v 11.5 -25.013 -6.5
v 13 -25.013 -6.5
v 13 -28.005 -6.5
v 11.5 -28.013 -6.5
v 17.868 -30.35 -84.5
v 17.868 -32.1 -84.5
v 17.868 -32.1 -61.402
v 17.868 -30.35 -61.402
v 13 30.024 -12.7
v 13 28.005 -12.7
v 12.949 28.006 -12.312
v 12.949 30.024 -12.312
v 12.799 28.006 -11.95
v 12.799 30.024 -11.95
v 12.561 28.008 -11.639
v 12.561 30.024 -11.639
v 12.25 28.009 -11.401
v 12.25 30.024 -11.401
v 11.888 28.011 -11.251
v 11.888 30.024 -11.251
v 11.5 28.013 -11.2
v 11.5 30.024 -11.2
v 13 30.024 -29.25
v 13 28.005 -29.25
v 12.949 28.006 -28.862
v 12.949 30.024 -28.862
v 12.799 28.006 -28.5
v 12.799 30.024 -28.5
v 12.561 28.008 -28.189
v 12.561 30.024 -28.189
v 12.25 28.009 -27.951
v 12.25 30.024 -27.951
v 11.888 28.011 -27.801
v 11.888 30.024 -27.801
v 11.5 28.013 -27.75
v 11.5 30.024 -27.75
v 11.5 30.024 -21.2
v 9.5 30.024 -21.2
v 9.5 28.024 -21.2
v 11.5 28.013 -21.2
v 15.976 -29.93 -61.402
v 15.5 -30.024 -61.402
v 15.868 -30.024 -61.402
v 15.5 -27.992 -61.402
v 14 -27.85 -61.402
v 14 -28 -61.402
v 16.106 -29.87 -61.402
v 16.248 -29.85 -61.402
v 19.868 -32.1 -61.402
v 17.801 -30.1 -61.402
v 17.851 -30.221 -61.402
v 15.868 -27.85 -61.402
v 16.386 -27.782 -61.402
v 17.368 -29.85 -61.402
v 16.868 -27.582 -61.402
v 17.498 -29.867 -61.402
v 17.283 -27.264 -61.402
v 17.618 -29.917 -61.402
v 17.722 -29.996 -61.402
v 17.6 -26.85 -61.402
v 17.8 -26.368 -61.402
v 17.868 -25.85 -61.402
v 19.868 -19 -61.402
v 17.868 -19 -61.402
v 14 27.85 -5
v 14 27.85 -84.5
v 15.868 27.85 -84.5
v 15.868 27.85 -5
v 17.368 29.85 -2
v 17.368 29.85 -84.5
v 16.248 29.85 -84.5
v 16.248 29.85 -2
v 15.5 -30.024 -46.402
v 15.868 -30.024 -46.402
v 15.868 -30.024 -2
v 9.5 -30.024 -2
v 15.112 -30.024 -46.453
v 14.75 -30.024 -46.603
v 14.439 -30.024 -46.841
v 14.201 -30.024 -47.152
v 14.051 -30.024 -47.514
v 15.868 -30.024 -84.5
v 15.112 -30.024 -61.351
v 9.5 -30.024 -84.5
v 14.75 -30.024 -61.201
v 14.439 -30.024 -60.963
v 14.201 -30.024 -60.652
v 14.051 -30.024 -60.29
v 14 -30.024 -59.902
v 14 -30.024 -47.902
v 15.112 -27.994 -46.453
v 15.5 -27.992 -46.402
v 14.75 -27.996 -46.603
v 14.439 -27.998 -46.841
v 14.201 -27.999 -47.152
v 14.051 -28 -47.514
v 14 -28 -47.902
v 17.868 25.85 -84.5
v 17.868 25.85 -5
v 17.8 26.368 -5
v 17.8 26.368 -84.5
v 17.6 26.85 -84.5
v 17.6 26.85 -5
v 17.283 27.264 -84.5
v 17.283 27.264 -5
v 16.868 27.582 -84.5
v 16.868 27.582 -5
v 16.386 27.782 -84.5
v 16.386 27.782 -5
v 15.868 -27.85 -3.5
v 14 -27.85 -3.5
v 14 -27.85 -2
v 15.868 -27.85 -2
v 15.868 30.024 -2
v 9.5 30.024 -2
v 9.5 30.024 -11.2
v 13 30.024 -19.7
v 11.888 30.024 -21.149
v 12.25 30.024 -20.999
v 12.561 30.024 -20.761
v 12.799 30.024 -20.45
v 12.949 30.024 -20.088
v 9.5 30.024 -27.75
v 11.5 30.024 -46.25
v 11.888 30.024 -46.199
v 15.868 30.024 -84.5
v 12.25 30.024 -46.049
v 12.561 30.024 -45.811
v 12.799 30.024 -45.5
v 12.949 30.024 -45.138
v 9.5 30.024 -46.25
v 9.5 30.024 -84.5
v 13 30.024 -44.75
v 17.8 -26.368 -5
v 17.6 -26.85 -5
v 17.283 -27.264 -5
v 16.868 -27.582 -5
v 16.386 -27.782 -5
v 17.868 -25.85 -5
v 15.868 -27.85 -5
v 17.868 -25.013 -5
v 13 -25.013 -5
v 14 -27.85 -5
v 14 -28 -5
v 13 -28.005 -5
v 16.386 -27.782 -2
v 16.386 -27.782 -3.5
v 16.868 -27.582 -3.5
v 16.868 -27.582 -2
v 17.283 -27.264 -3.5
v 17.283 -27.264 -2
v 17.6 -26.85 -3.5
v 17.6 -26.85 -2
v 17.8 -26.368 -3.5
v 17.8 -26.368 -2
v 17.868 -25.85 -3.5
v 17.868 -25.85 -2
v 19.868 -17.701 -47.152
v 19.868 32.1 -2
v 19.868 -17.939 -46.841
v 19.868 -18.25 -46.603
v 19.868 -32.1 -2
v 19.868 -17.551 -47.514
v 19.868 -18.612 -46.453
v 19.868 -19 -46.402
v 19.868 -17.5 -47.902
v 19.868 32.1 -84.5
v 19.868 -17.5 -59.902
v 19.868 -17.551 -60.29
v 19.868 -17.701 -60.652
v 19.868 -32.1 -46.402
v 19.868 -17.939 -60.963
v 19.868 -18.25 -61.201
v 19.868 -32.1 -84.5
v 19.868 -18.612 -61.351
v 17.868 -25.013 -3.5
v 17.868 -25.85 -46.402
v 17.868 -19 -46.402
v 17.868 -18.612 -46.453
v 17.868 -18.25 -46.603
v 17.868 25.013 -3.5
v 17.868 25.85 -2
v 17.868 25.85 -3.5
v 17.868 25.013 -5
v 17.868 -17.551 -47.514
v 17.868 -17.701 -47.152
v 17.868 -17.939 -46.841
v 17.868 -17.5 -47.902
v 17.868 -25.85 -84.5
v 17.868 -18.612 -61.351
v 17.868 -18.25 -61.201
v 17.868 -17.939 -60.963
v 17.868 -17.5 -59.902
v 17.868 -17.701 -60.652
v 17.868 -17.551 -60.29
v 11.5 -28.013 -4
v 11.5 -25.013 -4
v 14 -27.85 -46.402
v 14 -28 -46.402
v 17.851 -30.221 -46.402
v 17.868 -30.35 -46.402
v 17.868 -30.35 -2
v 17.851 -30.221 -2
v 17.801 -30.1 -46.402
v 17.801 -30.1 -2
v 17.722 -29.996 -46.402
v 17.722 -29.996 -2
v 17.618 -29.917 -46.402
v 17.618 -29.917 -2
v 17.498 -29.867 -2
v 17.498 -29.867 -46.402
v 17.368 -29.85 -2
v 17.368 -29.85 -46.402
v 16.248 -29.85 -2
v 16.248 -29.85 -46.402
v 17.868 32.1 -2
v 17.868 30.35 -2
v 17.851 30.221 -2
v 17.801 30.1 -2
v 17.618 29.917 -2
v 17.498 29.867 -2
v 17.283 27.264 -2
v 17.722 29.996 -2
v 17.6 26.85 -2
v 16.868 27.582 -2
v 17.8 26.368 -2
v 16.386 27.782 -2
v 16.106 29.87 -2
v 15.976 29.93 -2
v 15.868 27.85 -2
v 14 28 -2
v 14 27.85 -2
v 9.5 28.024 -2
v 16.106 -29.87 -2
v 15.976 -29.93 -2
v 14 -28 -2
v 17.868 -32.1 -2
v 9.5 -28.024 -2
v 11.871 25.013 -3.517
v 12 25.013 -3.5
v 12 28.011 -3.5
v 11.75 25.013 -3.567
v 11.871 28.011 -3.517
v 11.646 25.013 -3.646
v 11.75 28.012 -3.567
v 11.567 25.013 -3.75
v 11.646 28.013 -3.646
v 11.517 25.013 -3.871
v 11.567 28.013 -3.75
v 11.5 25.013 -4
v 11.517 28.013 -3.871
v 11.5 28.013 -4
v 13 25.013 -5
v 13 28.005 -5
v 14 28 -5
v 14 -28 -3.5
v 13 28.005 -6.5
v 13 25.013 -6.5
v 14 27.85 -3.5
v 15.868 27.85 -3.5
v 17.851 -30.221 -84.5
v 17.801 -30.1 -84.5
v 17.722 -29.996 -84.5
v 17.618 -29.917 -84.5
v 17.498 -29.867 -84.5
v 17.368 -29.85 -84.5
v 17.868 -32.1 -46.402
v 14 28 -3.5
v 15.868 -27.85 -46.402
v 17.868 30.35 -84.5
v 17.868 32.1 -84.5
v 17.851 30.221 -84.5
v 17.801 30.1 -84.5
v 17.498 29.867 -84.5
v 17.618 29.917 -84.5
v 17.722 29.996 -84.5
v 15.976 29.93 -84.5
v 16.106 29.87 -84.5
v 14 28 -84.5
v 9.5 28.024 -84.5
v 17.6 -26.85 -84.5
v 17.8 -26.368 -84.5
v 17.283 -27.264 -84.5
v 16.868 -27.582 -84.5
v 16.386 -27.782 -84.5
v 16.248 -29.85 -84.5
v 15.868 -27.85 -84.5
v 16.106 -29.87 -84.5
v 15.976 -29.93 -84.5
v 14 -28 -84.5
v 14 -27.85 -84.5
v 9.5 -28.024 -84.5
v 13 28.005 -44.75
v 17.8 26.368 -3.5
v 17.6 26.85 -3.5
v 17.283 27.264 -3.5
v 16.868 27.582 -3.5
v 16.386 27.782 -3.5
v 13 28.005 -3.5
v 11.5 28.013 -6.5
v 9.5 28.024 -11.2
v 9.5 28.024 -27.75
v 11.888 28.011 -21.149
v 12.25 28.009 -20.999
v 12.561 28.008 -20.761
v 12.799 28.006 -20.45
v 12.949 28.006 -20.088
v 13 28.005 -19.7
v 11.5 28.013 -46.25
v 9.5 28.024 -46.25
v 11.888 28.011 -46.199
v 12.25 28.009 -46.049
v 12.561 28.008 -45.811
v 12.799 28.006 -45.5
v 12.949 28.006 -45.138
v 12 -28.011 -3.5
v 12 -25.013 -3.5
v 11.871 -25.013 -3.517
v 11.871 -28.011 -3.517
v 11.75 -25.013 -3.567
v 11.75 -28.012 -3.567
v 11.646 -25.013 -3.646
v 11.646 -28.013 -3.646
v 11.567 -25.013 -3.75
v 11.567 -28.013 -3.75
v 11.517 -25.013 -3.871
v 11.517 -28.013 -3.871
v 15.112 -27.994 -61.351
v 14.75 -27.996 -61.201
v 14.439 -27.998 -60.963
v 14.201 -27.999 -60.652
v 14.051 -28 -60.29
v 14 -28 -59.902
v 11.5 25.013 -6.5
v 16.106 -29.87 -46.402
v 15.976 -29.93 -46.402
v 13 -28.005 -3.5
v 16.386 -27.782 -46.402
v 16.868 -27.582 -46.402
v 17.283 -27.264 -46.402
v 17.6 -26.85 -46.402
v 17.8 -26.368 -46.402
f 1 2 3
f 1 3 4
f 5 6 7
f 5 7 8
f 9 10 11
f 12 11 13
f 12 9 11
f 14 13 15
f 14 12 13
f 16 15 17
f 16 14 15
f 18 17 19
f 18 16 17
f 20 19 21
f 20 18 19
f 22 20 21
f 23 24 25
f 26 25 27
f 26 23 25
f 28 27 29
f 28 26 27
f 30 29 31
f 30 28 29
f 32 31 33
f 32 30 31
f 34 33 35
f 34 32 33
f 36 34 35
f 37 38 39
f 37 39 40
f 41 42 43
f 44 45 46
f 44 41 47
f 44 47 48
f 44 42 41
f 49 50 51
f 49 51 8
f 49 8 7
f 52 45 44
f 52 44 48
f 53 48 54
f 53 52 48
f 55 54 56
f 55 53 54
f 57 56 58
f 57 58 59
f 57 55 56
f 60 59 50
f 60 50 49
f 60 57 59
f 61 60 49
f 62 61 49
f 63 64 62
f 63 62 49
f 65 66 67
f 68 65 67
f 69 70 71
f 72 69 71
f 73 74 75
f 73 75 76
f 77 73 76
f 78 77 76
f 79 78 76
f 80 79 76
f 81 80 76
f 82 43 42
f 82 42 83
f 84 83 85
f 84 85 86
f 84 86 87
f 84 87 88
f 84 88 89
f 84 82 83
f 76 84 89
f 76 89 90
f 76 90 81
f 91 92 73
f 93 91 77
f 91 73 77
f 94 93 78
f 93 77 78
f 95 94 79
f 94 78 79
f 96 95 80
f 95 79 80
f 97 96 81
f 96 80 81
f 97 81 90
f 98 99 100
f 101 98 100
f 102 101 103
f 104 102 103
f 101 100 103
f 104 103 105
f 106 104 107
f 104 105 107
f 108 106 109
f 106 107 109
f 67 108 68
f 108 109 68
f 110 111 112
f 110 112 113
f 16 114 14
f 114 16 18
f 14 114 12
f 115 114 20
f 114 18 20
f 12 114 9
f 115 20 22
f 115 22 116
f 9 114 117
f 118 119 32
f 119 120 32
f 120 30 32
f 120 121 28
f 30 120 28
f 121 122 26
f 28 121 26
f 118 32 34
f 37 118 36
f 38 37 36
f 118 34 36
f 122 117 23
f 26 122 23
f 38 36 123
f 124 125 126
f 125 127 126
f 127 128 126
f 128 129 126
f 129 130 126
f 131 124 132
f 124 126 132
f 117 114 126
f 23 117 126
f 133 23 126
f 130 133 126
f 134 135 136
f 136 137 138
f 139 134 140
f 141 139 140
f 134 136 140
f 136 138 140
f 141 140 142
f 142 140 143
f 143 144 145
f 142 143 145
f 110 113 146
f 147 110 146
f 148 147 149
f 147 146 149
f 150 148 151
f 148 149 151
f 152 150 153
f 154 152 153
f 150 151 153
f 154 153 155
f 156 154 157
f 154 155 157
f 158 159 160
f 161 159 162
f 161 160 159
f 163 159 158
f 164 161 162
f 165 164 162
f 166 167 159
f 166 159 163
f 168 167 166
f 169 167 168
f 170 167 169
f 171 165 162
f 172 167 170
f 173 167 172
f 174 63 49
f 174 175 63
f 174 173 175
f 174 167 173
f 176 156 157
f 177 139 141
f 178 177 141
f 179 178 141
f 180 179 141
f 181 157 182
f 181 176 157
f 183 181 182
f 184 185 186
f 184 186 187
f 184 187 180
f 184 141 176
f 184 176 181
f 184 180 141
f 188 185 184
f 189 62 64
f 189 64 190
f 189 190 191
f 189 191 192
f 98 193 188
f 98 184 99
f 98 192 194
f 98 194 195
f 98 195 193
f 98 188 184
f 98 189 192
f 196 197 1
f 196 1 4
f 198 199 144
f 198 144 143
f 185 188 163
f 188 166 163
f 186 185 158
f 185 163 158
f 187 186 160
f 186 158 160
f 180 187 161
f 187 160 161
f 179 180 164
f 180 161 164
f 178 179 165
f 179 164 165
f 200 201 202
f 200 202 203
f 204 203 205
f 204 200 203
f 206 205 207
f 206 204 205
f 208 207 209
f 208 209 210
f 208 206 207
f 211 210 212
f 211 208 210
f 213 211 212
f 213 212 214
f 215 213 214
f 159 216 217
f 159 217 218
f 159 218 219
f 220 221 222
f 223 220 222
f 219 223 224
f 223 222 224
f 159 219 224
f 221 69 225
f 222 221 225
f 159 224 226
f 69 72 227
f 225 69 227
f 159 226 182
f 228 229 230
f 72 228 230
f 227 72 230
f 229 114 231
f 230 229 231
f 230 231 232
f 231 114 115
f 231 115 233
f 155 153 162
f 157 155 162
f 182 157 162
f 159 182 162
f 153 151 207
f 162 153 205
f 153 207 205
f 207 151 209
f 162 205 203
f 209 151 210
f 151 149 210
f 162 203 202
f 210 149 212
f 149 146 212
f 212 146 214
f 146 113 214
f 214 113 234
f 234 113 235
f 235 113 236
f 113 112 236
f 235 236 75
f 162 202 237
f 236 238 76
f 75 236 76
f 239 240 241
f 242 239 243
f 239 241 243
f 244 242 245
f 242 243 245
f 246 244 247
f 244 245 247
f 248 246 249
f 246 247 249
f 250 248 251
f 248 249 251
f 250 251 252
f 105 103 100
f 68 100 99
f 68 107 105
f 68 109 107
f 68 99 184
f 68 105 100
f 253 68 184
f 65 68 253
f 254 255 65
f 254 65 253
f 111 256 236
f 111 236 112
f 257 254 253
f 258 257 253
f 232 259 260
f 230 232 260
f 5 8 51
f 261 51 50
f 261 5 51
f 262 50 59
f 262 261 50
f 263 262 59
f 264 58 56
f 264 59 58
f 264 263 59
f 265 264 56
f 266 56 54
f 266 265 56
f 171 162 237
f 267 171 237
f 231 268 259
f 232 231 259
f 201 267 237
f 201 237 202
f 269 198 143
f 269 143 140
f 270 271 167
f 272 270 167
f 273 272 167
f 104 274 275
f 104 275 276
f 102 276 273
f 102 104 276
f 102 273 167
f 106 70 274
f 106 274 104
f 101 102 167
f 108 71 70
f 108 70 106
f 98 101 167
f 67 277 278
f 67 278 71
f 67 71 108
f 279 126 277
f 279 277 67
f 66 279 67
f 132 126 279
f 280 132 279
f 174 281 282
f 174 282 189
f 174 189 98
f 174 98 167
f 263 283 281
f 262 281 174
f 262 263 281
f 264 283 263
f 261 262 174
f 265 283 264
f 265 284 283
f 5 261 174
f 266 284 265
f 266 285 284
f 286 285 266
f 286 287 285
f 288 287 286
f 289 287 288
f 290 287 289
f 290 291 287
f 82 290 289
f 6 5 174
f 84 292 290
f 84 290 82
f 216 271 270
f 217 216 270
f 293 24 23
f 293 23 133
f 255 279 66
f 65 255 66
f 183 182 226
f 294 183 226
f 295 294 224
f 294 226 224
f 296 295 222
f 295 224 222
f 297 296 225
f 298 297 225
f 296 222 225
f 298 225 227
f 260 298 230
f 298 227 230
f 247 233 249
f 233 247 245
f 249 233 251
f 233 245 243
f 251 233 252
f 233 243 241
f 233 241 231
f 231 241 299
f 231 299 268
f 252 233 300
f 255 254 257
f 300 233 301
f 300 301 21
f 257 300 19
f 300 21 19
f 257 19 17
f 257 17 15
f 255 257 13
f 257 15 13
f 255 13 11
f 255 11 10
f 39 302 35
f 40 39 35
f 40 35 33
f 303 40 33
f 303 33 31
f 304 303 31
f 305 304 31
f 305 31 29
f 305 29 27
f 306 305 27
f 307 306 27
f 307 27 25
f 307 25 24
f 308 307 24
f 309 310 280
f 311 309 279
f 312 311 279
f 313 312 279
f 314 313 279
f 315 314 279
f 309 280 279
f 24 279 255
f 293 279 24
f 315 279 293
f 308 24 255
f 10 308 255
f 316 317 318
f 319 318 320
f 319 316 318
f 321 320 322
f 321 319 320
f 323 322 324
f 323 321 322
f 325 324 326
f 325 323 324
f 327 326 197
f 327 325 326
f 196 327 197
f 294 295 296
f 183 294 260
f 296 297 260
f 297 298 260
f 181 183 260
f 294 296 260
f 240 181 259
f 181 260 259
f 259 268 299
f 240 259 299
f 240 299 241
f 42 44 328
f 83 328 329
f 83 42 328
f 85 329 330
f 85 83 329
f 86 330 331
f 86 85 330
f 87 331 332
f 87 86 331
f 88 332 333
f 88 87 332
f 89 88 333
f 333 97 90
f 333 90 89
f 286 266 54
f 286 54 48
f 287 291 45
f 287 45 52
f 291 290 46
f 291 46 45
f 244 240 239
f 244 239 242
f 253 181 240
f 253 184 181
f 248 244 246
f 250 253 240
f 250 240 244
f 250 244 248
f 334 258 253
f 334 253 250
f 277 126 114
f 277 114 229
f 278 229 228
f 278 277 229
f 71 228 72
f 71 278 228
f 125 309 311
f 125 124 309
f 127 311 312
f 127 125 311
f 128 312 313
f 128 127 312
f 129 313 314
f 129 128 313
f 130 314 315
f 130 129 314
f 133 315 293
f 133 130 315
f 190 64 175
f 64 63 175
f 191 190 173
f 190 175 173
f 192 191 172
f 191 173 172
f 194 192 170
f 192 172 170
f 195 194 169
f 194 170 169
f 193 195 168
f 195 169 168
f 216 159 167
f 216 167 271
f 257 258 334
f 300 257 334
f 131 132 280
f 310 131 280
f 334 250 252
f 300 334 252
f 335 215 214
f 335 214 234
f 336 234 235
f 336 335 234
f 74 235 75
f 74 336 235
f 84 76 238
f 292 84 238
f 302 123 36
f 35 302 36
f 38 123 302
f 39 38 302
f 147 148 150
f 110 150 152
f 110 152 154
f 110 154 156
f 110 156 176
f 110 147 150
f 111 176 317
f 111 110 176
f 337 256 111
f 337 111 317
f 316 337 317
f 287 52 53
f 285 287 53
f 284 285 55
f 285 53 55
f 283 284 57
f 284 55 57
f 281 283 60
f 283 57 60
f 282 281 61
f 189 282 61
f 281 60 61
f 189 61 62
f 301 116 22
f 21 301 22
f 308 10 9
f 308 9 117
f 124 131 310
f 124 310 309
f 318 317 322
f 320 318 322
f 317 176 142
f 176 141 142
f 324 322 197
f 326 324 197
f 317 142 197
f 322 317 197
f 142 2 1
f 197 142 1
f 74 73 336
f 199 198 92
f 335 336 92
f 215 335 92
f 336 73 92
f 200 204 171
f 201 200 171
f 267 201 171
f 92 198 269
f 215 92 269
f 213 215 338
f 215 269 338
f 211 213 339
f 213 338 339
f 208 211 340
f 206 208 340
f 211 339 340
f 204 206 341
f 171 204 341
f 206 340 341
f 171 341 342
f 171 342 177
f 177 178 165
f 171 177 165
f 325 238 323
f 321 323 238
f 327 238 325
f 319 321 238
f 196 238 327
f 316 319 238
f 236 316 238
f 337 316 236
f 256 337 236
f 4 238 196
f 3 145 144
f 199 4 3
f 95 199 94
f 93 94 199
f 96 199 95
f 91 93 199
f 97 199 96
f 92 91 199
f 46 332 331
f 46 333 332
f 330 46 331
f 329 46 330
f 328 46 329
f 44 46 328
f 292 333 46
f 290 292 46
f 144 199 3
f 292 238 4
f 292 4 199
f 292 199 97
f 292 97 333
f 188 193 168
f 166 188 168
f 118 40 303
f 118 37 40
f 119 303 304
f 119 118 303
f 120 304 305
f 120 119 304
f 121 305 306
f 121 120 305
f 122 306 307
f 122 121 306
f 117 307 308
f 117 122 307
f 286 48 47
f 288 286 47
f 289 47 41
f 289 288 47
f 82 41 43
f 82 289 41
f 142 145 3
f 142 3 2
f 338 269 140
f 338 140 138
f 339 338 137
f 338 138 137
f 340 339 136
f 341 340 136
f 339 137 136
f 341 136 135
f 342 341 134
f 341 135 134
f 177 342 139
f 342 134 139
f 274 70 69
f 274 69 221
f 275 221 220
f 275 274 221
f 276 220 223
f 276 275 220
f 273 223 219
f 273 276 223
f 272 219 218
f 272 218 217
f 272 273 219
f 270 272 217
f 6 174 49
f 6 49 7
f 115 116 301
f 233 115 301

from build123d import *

# Parameters (mm, degrees)
BOSS_EXTRUDE1_START  = -82.5
BOSS_EXTRUDE1_DEPTH  = 82.5
SKETCH2_W            = 8.569638255
SKETCH2_H            = 10
SKETCH2_H_2          = 18.5
CUT_EXTRUDE1_DEPTH   = 93.549500309
FILLET2_R            = 2
FILLET3_R            = 0.5
CUT_EXTRUDE2_START   = -17.5
SKETCH2_3_W          = 11.636747081
SKETCH2_3_H          = 15
CUT_EXTRUDE2_DEPTH   = 76.049500309
FILLET1_R            = 1.5
BOSS_EXTRUDE3_START  = -3.5
BOSS_EXTRUDE3_DEPTH  = 3
BOSS_EXTRUDE4_START  = -5
BOSS_EXTRUDE4_DEPTH  = 1.5
FILLET5_R            = 0.5
FILLET5_OF_MIRROR4_R = 0.5


# Read off the part's stored shape, not the designer's step: Boss-Extrude1
with BuildPart() as part:
    # Boss-Extrude1 outline → Boss-Extrude1 (new body)
    with BuildSketch(Plane.XY.offset(-2).offset(BOSS_EXTRUDE1_START)):
        Polygon((17.868316672, 32.1), (17.868316672, 29.85), (15.868316672, 29.85), (15.868316672, 30.024283949), (9.5, 30.024283949), (9.5, 28.024283949), (14, 28), (14, 27.85), (17.868316672, 27.85), (17.868316672, 0), (19.868316672, 0), (19.868316672, 32.1), align=None)
    boss_extrude1 = extrude(amount=BOSS_EXTRUDE1_DEPTH)

    # Mirror1: Boss-Extrude1 across plane
    add(boss_extrude1.mirror(Plane.ZX))

    # Sketch2 → Cut-Extrude1 (cut, through all)
    with BuildSketch(Plane(origin=(0, 0, 0), x_dir=(1, 0, 0), z_dir=(0, 1, 0))):
        with Locations((8.715180872, 16.2)):
            Rectangle(SKETCH2_W, SKETCH2_H)
        with Locations((8.715180872, 37)):
            Rectangle(SKETCH2_W, SKETCH2_H_2)
    extrude(amount=CUT_EXTRUDE1_DEPTH, mode=Mode.SUBTRACT)

    # Fillet2
    fillet2_edges = [part.edges().sort_by_distance(p)[0] for p in [
        (17.868316672, 27.85, -43.25),
        (17.868316672, -27.85, -43.25),
    ]]
    fillet(fillet2_edges, radius=FILLET2_R)

    # Fillet3
    # the kernel refuses this fillet: 0.5 mm, written as the material it adds along each edge
    with BuildSketch(Plane(origin=(15.868316672, -29.85, -84.5), x_dir=(0, -1, 0), z_dir=(0, 0, 1))) as fillet3_piece_1:
        with BuildLine():
            CenterArc((0.5, 0.379353469), FILLET3_R, 180, 49.350336553)
            Line((0, 0.379353469), (-0.01, 0.379353469))
            Line((-0.01, 0.379353469), (-0.01, 0))
            Line((-0.01, 0), (0, -0.01))
            ThreePointArc((0, -0.01), (0.087141974, -0.01), (0.167769628, -0.007587069))
            Line((0.167769628, -0.007587069), (0.174283949, 0))
        make_face()
    extrude(amount=82.5)
    with BuildSketch(Plane(origin=(17.868316672, -29.85, -84.5), x_dir=(-1, 0, 0), z_dir=(0, 0, 1))) as fillet3_piece_2:
        with BuildLine():
            CenterArc((FILLET3_R, FILLET3_R), FILLET3_R, 180, 90)
            Line((0, FILLET3_R), (-FILLET3_R * 0.02, FILLET3_R))
            Line((-FILLET3_R * 0.02, FILLET3_R), (-FILLET3_R * 0.02, -FILLET3_R * 0.02))
            Line((-FILLET3_R * 0.02, -FILLET3_R * 0.02), (FILLET3_R, -FILLET3_R * 0.02))
            Line((FILLET3_R, -FILLET3_R * 0.02), (FILLET3_R, 0))
        make_face()
    extrude(amount=82.5)
    with BuildSketch(Plane(origin=(17.868316672, 29.85, -84.5), x_dir=(-1, 0, 0), z_dir=(0, 0, 1))) as fillet3_piece_3:
        with BuildLine():
            CenterArc((FILLET3_R, -FILLET3_R), FILLET3_R, 90, 90)
            Line((0, -FILLET3_R), (-FILLET3_R * 0.02, -FILLET3_R))
            Line((-FILLET3_R * 0.02, -FILLET3_R), (-FILLET3_R * 0.02, FILLET3_R * 0.02))
            Line((-FILLET3_R * 0.02, FILLET3_R * 0.02), (FILLET3_R, FILLET3_R * 0.02))
            Line((FILLET3_R, FILLET3_R * 0.02), (FILLET3_R, 0))
        make_face()
    extrude(amount=82.5)
    with BuildSketch(Plane(origin=(15.868316672, 29.85, -84.5), x_dir=(0, 1, 0), z_dir=(0, 0, 1))) as fillet3_piece_4:
        with BuildLine():
            CenterArc((0.5, -0.379353469), FILLET3_R, 130.649663447, 49.350336553)
            Line((0, -0.379353469), (-0.01, -0.379353469))
            Line((-0.01, -0.379353469), (-0.01, 0))
            Line((-0.01, 0), (0, 0.01))
            ThreePointArc((0, 0.01), (0.087141974, 0.01), (0.167769628, 0.007587069))
            Line((0.167769628, 0.007587069), (0.174283949, 0))
        make_face()
    extrude(amount=82.5)

    # Sketch2<3> → Cut-Extrude2 (cut, through all)
    with BuildSketch(Plane(origin=(0, 0, 0), x_dir=(1, 0, 0), z_dir=(0, 1, 0)).offset(CUT_EXTRUDE2_START)):
        with Locations((19.818373541, 53.901910681)):
            Rectangle(SKETCH2_3_W, SKETCH2_3_H)
    extrude(amount=-CUT_EXTRUDE2_DEPTH, mode=Mode.SUBTRACT)

    # Fillet1
    fillet1_edges = [part.edges().sort_by_distance(p)[0] for p in [
        (18.868316672, -17.5, -46.401910681),
        (14, -29.012141975, -46.401910681),
        (14, -29.012141975, -61.401910681),
        (18.868316672, -17.5, -61.401910681),
        (13, 29.014840191, -11.2),
        (13, 29.014840191, -21.2),
        (13, 29.014840191, -27.75),
        (13, 29.014840191, -46.25),
    ]]
    fillet(fillet1_edges, radius=FILLET1_R)

    # Sketch3 → Boss-Extrude3 (add)
    with BuildSketch(Plane.XY.offset(BOSS_EXTRUDE3_START)):
        Polygon((11.5, 28.013491083), (13, 28.005396433), (13, 25.013491083), (11.5, 25.013491083), align=None)
    boss_extrude3 = extrude(amount=-BOSS_EXTRUDE3_DEPTH)

    # Sketch3<6> → Boss-Extrude4 (add)
    with BuildSketch(Plane.XY.offset(BOSS_EXTRUDE4_START)):
        Polygon((13, 28.005396433), (17.868316672, 27.979124888), (17.868316672, 25.013491083), (13, 25.013491083), align=None)
    boss_extrude4 = extrude(amount=BOSS_EXTRUDE4_DEPTH)

    # Fillet5
    fillet5_edges = [part.edges().sort_by_distance(p)[0] for p in [
        (11.5, 26.513491083, -3.5),
    ]]
    fillet(fillet5_edges, radius=FILLET5_R)

    # Mirror4: Boss-Extrude3, Boss-Extrude4 across plane
    add(boss_extrude3.mirror(Plane.ZX))
    add(boss_extrude4.mirror(Plane.ZX))

    # Fillet5 of Mirror4
    fillet5_of_mirror4_edges = [part.edges().sort_by_distance(p)[0] for p in [
        (11.5, -26.513491083, -3.5),
    ]]
    fillet(fillet5_of_mirror4_edges, radius=FILLET5_OF_MIRROR4_R)


solid = part.part
